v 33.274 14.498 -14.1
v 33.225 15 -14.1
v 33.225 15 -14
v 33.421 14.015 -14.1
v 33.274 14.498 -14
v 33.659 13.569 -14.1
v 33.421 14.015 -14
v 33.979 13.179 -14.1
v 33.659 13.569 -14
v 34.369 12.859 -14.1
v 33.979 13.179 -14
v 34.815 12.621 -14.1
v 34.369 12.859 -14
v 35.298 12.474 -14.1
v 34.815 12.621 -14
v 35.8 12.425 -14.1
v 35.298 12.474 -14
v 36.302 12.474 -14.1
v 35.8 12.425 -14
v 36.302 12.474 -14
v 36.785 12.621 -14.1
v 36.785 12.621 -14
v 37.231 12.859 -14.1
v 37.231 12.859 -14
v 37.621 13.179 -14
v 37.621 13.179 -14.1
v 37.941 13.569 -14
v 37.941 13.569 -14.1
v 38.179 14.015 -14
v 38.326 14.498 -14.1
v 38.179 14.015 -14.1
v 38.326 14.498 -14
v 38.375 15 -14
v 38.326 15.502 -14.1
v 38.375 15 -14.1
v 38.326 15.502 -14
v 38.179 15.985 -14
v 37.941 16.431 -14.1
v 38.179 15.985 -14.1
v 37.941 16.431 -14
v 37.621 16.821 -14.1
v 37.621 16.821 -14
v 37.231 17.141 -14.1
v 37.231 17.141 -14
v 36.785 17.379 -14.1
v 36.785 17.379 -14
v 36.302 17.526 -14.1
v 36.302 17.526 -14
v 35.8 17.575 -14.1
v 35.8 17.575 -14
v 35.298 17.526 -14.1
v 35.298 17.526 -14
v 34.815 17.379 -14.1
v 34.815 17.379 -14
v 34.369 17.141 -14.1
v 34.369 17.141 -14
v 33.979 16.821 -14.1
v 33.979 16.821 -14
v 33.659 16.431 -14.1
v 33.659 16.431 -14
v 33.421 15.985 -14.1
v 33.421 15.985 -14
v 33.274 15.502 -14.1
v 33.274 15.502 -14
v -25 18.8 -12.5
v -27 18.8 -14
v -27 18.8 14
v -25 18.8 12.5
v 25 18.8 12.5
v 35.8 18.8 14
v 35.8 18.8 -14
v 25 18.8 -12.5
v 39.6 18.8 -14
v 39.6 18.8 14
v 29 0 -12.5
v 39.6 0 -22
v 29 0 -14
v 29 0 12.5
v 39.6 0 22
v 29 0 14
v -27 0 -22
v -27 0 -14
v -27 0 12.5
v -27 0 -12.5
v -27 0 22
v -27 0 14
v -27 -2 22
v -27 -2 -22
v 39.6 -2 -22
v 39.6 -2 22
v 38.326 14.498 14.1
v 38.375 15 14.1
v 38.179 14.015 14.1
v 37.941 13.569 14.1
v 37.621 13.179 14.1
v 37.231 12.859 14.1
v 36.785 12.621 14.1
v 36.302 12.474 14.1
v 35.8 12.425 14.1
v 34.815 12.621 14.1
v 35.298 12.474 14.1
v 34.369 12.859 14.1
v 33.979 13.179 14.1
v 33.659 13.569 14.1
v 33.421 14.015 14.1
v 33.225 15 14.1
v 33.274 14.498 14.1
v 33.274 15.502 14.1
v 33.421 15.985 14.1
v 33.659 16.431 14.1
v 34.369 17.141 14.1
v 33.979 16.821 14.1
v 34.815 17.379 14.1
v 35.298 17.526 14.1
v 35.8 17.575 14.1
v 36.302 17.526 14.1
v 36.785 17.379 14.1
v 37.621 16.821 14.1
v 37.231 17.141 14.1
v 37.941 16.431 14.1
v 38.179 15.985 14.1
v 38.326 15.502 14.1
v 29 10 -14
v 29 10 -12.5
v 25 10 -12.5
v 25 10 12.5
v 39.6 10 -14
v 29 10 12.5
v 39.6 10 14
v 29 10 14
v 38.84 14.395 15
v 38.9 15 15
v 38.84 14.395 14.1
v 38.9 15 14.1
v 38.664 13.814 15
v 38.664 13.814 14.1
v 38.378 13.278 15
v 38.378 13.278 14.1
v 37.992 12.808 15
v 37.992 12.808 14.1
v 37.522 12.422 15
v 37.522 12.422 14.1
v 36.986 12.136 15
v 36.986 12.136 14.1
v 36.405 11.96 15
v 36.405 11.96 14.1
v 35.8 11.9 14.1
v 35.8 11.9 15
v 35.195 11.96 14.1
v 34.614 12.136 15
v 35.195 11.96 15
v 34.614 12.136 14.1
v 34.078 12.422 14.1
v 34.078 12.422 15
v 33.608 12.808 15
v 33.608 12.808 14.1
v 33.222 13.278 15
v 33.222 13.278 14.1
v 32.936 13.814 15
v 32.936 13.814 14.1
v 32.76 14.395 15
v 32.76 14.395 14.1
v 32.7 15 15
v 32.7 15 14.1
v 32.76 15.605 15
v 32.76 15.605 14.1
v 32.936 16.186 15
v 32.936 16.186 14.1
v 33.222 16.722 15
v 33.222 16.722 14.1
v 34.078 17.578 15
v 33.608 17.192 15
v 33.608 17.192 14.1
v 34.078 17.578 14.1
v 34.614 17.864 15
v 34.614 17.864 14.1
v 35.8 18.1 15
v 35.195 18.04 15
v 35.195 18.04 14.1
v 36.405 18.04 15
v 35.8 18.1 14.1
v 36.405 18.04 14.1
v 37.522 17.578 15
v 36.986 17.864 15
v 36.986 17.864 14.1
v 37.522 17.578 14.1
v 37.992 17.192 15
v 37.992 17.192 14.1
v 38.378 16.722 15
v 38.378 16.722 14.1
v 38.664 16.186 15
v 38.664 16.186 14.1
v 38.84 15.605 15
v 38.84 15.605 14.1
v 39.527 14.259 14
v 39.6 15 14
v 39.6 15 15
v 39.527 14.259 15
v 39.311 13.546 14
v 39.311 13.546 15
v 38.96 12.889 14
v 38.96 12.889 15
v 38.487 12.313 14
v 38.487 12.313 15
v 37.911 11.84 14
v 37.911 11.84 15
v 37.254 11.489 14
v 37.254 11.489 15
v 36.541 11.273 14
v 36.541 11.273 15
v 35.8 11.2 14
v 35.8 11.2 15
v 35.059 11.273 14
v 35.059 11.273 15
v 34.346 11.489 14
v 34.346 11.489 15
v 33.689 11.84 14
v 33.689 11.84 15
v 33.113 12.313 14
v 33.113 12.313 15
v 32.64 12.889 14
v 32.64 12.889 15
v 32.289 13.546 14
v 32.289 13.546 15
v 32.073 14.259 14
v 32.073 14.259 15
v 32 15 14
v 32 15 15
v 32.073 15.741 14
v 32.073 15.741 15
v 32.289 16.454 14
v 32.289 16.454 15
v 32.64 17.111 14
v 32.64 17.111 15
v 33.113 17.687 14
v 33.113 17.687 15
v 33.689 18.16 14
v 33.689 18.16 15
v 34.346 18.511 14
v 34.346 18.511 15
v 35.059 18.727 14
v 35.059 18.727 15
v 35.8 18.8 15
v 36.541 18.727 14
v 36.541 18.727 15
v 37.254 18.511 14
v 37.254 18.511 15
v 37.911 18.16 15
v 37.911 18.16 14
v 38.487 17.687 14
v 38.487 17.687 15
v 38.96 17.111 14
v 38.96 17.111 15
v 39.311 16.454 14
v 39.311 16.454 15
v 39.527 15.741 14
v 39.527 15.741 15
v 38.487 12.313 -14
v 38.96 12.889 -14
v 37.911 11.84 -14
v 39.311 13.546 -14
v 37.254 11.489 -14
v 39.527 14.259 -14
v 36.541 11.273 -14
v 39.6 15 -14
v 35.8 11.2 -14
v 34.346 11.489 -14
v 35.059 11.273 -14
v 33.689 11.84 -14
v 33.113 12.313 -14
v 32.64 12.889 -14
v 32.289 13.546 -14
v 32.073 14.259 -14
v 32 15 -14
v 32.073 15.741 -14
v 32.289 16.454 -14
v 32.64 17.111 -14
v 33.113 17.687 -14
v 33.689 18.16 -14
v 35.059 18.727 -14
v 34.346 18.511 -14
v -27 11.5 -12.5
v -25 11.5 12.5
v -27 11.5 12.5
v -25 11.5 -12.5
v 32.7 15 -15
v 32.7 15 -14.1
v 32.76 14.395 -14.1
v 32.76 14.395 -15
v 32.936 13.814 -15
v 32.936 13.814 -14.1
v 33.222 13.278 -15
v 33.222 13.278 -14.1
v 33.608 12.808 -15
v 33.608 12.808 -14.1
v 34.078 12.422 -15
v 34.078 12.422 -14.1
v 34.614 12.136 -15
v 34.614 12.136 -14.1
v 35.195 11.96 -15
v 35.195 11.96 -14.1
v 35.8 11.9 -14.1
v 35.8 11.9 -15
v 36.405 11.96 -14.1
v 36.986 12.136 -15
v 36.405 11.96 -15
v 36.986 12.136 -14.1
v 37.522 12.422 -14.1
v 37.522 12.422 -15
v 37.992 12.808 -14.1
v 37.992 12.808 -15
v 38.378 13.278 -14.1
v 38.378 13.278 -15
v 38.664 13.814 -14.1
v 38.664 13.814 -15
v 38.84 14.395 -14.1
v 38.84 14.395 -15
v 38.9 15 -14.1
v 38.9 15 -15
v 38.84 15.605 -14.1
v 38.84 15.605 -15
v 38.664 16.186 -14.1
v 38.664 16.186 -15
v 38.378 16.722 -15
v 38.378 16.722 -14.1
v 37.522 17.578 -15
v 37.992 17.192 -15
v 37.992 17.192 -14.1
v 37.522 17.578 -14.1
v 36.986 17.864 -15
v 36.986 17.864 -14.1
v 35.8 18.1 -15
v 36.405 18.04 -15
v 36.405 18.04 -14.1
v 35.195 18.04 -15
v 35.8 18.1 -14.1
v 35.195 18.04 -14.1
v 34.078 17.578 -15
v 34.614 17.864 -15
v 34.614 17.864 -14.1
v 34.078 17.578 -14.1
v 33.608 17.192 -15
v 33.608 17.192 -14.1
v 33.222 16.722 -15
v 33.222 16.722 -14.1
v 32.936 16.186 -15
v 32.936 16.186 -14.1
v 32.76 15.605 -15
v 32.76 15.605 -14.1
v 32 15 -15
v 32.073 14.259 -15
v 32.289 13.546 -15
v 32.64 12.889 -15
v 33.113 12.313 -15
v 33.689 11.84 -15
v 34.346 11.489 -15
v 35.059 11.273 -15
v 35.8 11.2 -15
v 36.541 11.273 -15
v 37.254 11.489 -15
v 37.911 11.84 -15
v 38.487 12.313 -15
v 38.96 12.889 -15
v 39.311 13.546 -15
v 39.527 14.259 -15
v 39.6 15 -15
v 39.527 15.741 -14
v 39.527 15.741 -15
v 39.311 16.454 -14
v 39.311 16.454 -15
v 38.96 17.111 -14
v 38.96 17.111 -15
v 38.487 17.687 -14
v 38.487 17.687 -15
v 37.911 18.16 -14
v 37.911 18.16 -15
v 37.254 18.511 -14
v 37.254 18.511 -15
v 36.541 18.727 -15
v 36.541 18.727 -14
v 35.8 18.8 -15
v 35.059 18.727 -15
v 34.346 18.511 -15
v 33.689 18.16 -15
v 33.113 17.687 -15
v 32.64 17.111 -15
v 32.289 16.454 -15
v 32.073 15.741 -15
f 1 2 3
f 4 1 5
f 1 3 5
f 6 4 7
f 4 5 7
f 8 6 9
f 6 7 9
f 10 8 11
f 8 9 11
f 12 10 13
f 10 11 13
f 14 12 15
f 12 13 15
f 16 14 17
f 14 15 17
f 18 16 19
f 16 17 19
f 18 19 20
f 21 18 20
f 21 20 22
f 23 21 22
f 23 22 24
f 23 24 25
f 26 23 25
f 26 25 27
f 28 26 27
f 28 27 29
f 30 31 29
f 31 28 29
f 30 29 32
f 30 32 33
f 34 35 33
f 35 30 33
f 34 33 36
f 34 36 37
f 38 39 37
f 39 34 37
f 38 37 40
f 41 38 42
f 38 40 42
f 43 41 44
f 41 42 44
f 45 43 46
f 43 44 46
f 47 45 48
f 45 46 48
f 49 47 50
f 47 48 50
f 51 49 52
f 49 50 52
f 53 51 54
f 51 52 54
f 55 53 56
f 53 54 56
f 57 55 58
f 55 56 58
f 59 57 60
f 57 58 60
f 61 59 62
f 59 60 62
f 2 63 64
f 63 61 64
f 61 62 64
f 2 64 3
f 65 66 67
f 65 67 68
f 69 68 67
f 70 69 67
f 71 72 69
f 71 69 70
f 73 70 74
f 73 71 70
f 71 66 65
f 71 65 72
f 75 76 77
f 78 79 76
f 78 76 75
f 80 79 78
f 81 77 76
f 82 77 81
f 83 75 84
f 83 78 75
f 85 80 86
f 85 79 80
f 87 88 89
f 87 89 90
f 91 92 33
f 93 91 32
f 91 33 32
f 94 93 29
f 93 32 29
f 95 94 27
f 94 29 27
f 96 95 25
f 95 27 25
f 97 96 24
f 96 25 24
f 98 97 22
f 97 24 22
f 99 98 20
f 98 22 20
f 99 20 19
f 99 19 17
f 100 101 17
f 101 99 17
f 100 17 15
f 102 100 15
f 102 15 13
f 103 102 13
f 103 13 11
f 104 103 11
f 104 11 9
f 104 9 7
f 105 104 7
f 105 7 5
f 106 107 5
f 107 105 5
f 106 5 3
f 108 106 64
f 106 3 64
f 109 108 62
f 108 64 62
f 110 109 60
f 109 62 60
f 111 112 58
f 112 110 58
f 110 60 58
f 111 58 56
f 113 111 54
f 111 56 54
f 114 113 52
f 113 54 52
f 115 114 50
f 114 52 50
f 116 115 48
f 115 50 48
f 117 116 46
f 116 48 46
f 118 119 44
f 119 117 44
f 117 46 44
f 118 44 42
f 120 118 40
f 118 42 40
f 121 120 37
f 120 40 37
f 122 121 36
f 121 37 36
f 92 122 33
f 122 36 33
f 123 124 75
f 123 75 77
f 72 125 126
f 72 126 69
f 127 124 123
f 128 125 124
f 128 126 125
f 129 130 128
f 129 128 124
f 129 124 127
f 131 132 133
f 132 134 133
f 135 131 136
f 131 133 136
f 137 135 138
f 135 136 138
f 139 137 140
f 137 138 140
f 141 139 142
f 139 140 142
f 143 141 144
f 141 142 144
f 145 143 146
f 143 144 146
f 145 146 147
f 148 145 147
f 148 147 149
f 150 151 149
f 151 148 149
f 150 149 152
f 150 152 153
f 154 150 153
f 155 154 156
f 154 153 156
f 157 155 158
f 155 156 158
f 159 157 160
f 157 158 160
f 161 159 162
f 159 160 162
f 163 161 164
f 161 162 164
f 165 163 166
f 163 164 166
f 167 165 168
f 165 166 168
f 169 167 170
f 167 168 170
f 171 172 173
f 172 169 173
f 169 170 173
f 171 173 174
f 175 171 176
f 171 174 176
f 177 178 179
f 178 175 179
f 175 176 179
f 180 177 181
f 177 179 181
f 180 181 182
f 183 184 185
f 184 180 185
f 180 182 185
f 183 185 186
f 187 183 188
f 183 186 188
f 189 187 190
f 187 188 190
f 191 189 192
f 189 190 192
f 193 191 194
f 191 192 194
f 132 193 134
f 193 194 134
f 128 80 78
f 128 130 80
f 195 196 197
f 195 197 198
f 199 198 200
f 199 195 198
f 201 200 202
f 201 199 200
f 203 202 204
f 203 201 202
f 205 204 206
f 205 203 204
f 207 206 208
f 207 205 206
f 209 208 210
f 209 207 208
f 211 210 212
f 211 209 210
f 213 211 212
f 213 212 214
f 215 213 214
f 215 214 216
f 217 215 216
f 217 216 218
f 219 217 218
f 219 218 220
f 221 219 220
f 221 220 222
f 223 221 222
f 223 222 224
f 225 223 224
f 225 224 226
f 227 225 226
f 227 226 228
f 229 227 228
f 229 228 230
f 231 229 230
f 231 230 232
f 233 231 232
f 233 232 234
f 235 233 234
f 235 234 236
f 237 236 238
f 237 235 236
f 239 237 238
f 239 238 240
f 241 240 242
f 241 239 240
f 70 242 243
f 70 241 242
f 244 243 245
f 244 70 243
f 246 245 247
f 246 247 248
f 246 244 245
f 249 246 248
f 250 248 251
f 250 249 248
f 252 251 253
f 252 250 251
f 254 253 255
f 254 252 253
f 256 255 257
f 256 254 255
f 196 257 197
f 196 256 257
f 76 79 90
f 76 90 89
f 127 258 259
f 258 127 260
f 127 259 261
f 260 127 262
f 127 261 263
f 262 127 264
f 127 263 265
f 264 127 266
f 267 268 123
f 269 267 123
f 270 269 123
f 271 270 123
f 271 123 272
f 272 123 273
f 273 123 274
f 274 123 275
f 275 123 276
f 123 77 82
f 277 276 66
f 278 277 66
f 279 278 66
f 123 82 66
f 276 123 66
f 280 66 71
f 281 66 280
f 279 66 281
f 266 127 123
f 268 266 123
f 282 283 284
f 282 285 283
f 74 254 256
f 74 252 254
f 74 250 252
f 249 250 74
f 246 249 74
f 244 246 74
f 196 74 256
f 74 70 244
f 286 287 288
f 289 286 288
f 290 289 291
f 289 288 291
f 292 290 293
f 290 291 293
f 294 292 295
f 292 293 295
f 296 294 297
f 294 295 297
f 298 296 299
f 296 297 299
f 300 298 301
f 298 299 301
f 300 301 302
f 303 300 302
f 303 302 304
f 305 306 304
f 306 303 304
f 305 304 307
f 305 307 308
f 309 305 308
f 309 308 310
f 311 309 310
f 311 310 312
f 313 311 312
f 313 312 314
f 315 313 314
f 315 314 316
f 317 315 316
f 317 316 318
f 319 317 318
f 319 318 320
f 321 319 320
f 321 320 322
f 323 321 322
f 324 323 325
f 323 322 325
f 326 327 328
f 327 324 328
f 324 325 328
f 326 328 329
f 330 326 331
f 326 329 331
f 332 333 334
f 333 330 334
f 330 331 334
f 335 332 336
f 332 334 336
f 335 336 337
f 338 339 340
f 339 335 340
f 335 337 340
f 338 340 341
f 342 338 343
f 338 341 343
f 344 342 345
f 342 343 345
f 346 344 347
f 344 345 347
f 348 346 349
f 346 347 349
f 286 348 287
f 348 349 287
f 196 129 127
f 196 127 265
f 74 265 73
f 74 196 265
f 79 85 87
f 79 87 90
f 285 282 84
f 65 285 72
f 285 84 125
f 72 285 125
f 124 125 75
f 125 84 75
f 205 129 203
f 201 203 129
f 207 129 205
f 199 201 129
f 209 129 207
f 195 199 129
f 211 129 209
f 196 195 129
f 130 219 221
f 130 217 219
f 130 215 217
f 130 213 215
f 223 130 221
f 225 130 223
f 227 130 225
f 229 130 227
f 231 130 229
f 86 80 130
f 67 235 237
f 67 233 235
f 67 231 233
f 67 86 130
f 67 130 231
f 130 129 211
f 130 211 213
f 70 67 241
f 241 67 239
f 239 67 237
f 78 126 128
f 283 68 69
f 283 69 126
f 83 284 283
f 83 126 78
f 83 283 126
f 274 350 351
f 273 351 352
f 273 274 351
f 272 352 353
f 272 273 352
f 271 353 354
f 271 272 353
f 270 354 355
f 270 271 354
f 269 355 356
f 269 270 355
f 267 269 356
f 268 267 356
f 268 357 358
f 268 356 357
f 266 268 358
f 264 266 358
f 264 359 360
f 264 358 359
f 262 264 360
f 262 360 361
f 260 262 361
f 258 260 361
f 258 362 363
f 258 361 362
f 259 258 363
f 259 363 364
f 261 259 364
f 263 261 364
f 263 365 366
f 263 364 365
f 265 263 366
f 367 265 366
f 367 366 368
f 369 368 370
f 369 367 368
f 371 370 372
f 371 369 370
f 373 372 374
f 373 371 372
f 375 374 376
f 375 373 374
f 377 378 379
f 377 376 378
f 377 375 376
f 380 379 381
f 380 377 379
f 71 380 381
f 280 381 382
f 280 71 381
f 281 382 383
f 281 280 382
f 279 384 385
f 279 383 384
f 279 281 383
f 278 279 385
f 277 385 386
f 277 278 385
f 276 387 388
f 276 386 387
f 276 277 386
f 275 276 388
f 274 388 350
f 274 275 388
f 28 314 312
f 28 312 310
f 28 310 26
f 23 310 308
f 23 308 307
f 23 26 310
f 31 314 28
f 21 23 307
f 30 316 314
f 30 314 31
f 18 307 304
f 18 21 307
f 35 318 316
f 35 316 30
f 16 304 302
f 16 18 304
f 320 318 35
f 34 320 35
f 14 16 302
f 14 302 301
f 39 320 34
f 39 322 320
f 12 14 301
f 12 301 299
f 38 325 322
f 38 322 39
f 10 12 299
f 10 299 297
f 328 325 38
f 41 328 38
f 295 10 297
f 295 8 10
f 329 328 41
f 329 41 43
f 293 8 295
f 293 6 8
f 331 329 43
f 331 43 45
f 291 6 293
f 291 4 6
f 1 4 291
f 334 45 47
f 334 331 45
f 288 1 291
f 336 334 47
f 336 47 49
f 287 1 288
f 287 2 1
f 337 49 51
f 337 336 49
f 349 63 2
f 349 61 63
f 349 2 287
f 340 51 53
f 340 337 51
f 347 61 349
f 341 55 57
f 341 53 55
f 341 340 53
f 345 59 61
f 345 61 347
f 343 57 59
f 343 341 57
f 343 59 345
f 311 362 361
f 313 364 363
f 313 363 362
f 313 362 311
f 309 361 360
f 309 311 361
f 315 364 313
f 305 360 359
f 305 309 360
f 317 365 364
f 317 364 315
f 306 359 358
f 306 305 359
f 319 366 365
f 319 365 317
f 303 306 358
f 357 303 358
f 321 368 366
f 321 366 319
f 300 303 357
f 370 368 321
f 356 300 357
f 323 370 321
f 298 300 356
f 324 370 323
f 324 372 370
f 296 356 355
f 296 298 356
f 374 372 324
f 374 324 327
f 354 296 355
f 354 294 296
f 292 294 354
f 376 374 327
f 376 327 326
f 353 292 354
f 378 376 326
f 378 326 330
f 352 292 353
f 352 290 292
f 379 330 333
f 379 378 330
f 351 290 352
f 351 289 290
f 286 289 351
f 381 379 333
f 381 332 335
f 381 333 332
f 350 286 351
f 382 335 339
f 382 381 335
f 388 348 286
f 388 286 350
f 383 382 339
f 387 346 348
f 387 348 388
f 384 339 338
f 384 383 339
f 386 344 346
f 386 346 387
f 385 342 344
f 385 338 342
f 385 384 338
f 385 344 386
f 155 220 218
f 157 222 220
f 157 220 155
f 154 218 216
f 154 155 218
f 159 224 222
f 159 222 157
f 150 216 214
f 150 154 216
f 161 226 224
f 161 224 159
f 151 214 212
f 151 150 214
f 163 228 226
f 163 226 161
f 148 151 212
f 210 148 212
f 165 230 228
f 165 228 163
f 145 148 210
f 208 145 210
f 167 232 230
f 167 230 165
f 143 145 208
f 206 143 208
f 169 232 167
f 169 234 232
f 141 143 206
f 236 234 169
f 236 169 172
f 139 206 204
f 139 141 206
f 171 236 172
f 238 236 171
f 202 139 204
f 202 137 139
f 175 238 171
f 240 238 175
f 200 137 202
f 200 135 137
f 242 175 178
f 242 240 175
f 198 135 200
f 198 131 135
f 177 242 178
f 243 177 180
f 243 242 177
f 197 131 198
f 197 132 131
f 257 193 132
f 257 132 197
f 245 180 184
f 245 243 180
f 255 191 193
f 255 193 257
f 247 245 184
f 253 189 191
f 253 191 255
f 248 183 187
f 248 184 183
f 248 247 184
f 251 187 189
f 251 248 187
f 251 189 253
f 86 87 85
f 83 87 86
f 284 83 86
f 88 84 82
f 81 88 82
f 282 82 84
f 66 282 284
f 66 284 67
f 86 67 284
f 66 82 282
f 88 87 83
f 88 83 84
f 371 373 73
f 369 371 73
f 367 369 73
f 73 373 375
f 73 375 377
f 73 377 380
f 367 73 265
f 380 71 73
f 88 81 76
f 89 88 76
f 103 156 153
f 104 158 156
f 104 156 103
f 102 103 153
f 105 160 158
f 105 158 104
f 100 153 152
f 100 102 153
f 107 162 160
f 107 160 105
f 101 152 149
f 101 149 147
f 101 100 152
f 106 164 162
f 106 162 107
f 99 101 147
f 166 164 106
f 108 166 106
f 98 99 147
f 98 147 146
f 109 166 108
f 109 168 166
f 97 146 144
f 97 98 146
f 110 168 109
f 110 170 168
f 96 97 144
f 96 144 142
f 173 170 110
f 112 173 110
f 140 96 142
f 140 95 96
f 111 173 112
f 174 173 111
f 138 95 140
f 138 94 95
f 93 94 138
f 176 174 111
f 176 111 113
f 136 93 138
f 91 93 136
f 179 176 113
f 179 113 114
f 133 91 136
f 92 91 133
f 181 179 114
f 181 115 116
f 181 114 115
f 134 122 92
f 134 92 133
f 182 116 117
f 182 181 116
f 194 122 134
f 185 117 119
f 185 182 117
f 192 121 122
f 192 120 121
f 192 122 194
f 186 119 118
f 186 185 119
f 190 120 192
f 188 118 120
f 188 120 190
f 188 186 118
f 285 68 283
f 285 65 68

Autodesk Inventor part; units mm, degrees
ref_plane "YZ Plane" through (0, 0, 0) normal (1, 0, 0) x (0, 1, 0)
ref_plane "XZ Plane" through (0, 0, 0) normal (0, 1, 0) x (-1, 0, 0)
ref_plane "XY Plane" through (0, 0, 0) normal (0, 0, 1) x (1, 0, 0)
sketch "Sketch1" plane through (0, 0, 0) normal (0, 1, 0) x (-1, 0, 0)
  line L0 (-25, 12.5) -> (25, 12.5)
  line L1 (25, 12.5) -> (25, -12.5)
  line L2 (25, -12.5) -> (-25, -12.5)
  line L3 (-25, -12.5) -> (-25, 12.5)
  line L4 (-25, 12.5) -> (25, -12.5) construction
  line L5 (25, 12.5) -> (-25, -12.5) construction
  line L6 (27, 14) -> (27, -14)
  line L7 (-25, 12.5) -> (-25, 14)
  line L8 (-25, 14) -> (27, 14)
  line L9 (27, -14) -> (-25, -14)
  line L10 (-25, -14) -> (-25, -12.5)
  line L11 (25, 12.5) -> (27, 12.5)
  line L12 (25, -12.5) -> (27, -12.5)
  line L13 (-25, -14) -> (27, -14)
  line L14 (27, -14) -> (27, -22)
  line L15 (27, -22) -> (-25, -22)
  line L16 (-25, -22) -> (-25, -14)
  line L17 (27, 0) -> (-25, 0)
  line L18 (-25, 14) -> (27, 14)
  line L19 (27, 14) -> (27, 22)
  line L20 (27, 22) -> (-25, 22)
  line L21 (-25, 22) -> (-25, 14)
  point P0 (0, 0)
  point P1 (27, 14)
  dimension "d0" = 25
  dimension "d1" = 50
  dimension "d2" = 2
  dimension "d3" = 1.5
  dimension "d4" = 1.5
  dimension "d60" = 8
extrude "Extrusion1" add sketch "Sketch1" against normal blind 2 contours L7 L8 L6 L11 L0 | L0 L1 L17 L3 | L11 L6 L17 L1 | L17 L1 L2 L3 | L17 L6 L12 L1 | L2 L12 L6 L9 L10
extrude "Extrusion2" add sketch "Sketch1" along normal blind 18.8 contours L7 L8 L6 L11 L0 | L2 L12 L6 L9 L10
sketch "Sketch2" plane through (-27, 0, -12.5) normal (0, 0, 1) x (1, 0, 0)
  line L0 (0, 18.8) -> (0, 20)
  line L1 (0, 0) -> (0, 18.8) projected
  line L2 (0, 18.8) -> (2, 18.8)
  line L3 (0, 18.8) -> (52, 18.8) projected
  line L4 (2, 18.8) -> (2, 11.5)
  line L5 (52, 0) -> (0, 0) projected
  line L6 (2, 11.5) -> (0, 11.5)
  line L7 (0, -2) -> (0, 18.8) projected
  point P0 (27, 0)
  dimension "d13" = 11.5
  dimension "d14" = 20
  dimension "d15" = 2
extrude "Extrusion3" add sketch "Sketch2" along normal up to surface (25 mm away)
sketch "Sketch4" plane through (-27, -2, 14) normal (0, 0, 1) x (1, 0, 0)
  circle A0 centre (62.8, 17) radius 2.575
  circle A1 centre (62.8, 17) radius 3.1
  circle A2 centre (62.8, 17) radius 3.8
  line L0 (52, 2) -> (52, 20.8) projected
  line L1 (52, 12) -> (66.6, 12)
  line L2 (66.6, 12) -> (66.6, 20.8)
  line L3 (66.6, 20.8) -> (52, 20.8)
  point P0 (27, 2)
  dimension "d31" = 5.15
  dimension "d32" = 6.2
  dimension "d33" = 0.7
  dimension "d34" = 10
  dimension "d35" = 15
  dimension "d61" = 14.6
extrude "Extrusion4" add sketch "Sketch4" against normal up to surface (28 mm away) contours A1 | A2 | L2 L1 L0 L3 A2 | A2 L3 L2
sketch "Sketch5" plane through (25, -2, 14) normal (1, 0, 0) x (0, 0, -1)
  line L0 (0, 0) -> (0, 12) projected
  line L1 (0, 2) -> (28, 2)
  line L2 (28, 0) -> (28, 12) projected
  line L3 (1.5, 2) -> (26.5, 2) projected
  line L4 (28, 12) -> (26.5, 12) projected
  line L5 (26.5, 2) -> (26.5, 12) projected
  line L6 (1.5, 12) -> (1.5, 2) projected
  line L7 (26.5, 12) -> (1.5, 12) projected
  line L8 (26.5, 12) -> (26.5, 20.8) projected
  line L9 (26.5, 20.8) -> (28, 20.8) projected
  line L10 (28, 20.8) -> (28, 12) projected
  line L11 (28, 12) -> (28, 0) projected
  line L12 (28, 0) -> (0, 0) projected
  line L13 (0, 0) -> (0, 12) projected
  line L14 (0, 12) -> (0, 20.8) projected
  line L15 (0, 20.8) -> (1.5, 20.8) projected
  line L16 (1.5, 20.8) -> (1.5, 12) projected
  line L17 (1.5, 12) -> (0, 12) projected
  line L18 (1.5, 20.8) -> (26.5, 20.8) projected
  line L19 (1.5, 2) -> (26.5, 2) projected
  point P0 (14, 2)
extrude "Extrusion6" add sketch "Sketch5" along normal up to surface (14.6 mm away) contours L0 L1 L2 L12
extrude "Extrusion8" add sketch "Sketch5" along normal blind 4 contours L0 L17 L6 L1 | L1 L5 L4 L2
extrude "Extrusion9" add sketch "Sketch4" along normal blind 1 contours A2
extrude "Extrusion10" add sketch "Sketch4" along normal blind 0.1 contours A1
sketch "Sketch7" plane through (-27, -2, -14) normal (0, 0, -1) x (-1, 0, 0)
  circle A0 centre (-62.8, 17) radius 3.8 projected
  circle A1 centre (-62.8, 17) radius 3.1 projected
  circle A2 centre (-62.8, 17) radius 3.1 projected
  circle A3 centre (-62.8, 17) radius 2.575 projected
  point P0 (-27, 2)
extrude "Extrusion11" add sketch "Sketch7" along normal blind 0.1 contours A1
extrude "Extrusion12" add sketch "Sketch7" along normal blind 1 contours A0
extrude "Extrusion13" add sketch "Sketch1" against normal up to surface (2 mm away) contours L21 L20 L19 L8 | L9 L14 L15 L16
sketch "Sketch8" plane through (25, 0, 22) normal (1, 0, 0) x (0, 0, -1)
  line L0 (0, -2) -> (8, -2) projected
  line L1 (8, 0) -> (8, -2) projected
  line L2 (0, 0) -> (8, 0) projected
  line L3 (0, 0) -> (0, -2) projected
  line L4 (36, -2) -> (44, -2) projected
  line L5 (44, 0) -> (44, -2) projected
  line L6 (36, 0) -> (44, 0) projected
  line L7 (36, -2) -> (36, 0) projected
  point P0 (22, 0)
extrude "Extrusion14" add sketch "Sketch8" along normal up to surface (14.6 mm away)
equation "\"d4\" = d3"
equation "\"d15\" = d2"
properties part number "chaimber"
